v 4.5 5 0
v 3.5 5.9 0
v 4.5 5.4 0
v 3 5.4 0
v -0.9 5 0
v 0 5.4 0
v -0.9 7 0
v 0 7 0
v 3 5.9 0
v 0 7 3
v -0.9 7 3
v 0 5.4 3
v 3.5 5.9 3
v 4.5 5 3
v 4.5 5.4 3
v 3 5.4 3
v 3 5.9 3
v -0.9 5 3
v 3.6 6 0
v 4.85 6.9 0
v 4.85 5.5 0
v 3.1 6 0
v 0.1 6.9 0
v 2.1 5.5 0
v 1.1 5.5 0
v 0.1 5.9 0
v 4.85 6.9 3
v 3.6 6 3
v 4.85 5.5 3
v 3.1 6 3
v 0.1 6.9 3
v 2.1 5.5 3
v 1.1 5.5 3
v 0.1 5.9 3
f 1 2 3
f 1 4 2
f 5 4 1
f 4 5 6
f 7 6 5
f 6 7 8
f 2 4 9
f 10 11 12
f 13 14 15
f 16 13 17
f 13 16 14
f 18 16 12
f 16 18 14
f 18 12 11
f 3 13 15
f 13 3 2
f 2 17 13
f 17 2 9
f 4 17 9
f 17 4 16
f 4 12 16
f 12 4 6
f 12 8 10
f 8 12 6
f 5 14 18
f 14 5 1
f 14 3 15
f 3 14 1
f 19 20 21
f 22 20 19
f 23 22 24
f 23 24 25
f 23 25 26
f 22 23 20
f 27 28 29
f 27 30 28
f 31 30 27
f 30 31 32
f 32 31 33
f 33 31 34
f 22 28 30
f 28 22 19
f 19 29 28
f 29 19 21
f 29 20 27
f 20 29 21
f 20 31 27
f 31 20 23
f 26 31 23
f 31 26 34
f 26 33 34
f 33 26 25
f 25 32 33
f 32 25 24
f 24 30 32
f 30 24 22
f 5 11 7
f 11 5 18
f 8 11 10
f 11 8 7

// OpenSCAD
// file: hull.scad
/*
hull.scad - a library that leverages the hull() procedure
Author: Elliot Williams
github: https://gist.github.com/hexagon5un )
source: https://gist.github.com/hexagon5un/73e187dfa0404c69177795424f397ce6#file-hull-scad

Featured in the hackaday atricle: 'OPENSCAD: TIEING IT TOGETHER WITH HULL()'
https://hackaday.com/2018/02/13/openscad-tieing-it-together-with-hull/
*/
module multiHull(){
	for (i = [1 : $children-1])
		hull(){
			children(0);
			children(i);
		}
}

module sequentialHull(){
	for (i = [0: $children-2])
		hull(){
			children(i);
			children(i+1);
		}
}

/* Extended fun hull functions */ 

module cylinders(points, diameter, thickness){
	for (p=points){
		translate(p) cylinder(d=diameter, h=thickness, center=true);
	}
}

module plate(points, diameter, thickness, hole_diameter){
	difference(){
		hull() cylinders(points, diameter, thickness);
		cylinders(points, hole_diameter, 1000);
	}
}

module bar(length, width, thickness, hole_diameter){
	plate([[0,0,0], [length,0,0]], width, thickness, hole_diameter);
}

module rounded_box(points, radius, height, facets=30){
	hull(){
		for (p = points){
			translate(p)
				cylinder(r=radius, h=height, $fn=facets);
		}
	}
}

module point_cloud(points, radius=1, facets=8){
	for (p=points){
		translate(p)
			sphere(radius/cos(180/facets), $fn=facets);
		// polygon sphere circumscribed on radius
	}
}

module point_hull(points, radius=1, facets=8){
	hull(){
		point_cloud(points, radius, facets);
	}
}

// Shrink the exterior of the points so that the hull fits inside
function select(vector, i) = [ for (p=vector) p[i] ];
function axis_center(v, i) = (max(select(v, i)) - min(select(v,i)))/2;
function center(v) = [ for (i = [0,1,2]) axis_center(v, i) ];
function shrink_point(point, center, radius) = [ for (i = [0,1,2]) point[i] > center[i] ? point[i] - radius : point[i] + radius ]; 
function shrink(points, radius) = [ for (p = points) shrink_point(p, center(points), radius) ];

module interior_point_hull(points, radius=1){
	point_hull(shrink(points, radius), radius);
}

module interior_rounded_box(points, radius, height){
	rounded_box(shrink(points, radius), radius, height);
}


module mirror_copy(v = [1, 0, 0]) {
    children();
    mirror(v) children();
}
// file: basics.scad
///< Basics module
use <math.scad>;
use <utils.scad>;
use <hull.scad>;

module triangle( w, d, h ){
     difference(){
	  hyp = hyp_from_sides( d, h );
	  color( "red" )cube( [w, d, h] );
	  rotate( [ 45, 0, 0 ] )
	       translate( [ -0.01, 0, 0 ] )
	       color( "green" )cube( [w+0.2, hyp, h] );
     }
}

module tri_xy(pt1, pt2, pt3, h=1) {
     color( rands( 0,1,3 ) ) linear_extrude( height=h )
	  polygon( points=[ pt1, pt2, pt3 ] );
}

module triangle_xy( pts, h=1) {
     color( rands( 0,1,3 ) ) linear_extrude( height=h )
	  polygon( points = pts );
}

module oval(w,l, height, center = false, fn = 30) {
 scale([1, l/w, 1]) cylinder(h=height, r=w, center=center, $fn = fn);
}

module pipe( outer, inner, height, fn = 60 ){
     offset_percent = 0.25;
     inner_h = height + (offset_percent * 2 );
     difference(){
     ///< Debug with union(){
	  cylinder(r=outer, h = height, $fn = fn );
	  translate([0,0,-offset_percent]){
	       color("green",0.5)cylinder(r=inner, h = inner_h, $fn = fn );
	  }
     }
}

module rounded_pipe( r, h, fn = 60 ){
     cylinder(r = r, h = h, $fn = fn );

     color("blue")
     translate([0,0,h])
	  sphere(r, $fn = fn );

     color("red")
     translate([0,0,0])
	  sphere(r, $fn = fn );
}

/// Stackoverflow example module for a line
/// https://stackoverflow.com/questions/49533350/is-that-possible-to-draw-a-line-using-openscad-by-joining-different-points
module line(start, end, thickness = 1, fn = 30) {
    hull() {
	translate(start) sphere(thickness, $fn = fn);
	translate(end) sphere(thickness, $fn = fn);
    }
}


/*
Hulled box:

Parameterized box with rounded corners. This uses the hull.scad
to hull four cylinders around four point in space. This variation
offsets the box to zero/zero and takes in w,d,h to mesh better
with tuples.
*/
module hulled_cube( w, d, h, r = 1 ){
    points = [
	[ 0, 0, 0 ],
	[ w, 0, 0 ],
	[ 0, w, 0 ],
	[ w, w, 0 ],
	];
    resize( [w,d,h]){
	translate( [r, r,0] ){
	    rounded_box( points, radius = r, height=h );
	}
    }
}
// file: utils.scad
///< Utilities

function rand_clr() = rands( 0,1,3 );

///< Length conversions
function in2mm( i ) = ( i * 25.4 ); 
function mm2in( m ) = ( m / 25.4 );

/// This is pulled from stackoverflow
/// https://stackoverflow.com/questions/45826208/openscad-rotating-around-a-particular-point

// rotate as per a, v, but around point pt
module rotate_about_pt(a, v, pt) {
    translate(pt)
        rotate(a,v)
            translate(-pt)
                children();   
}
// file: math.scad
///< Math scad module


///< Find the hypotenuse from two sides of a right triangle
function hyp_from_sides( a, b ) = sqrt( pow( a, 2 ) + pow( b, 2 ) );

///< Find equal sides from hypotenuse of a right triangle
function sides_from_hyp(h) = sqrt( pow( h, 2 ) / 2 );

///< Find A from hypotenuse and B
function a_from_hb( h, b ) = sqrt( pow( h, 2 ) - pow( b, 2 ) );

function dist_2d( pt2, pt1 ) = sqrt(pow(( pt2[0]-pt1[0] ),2) + pow(( pt2[1]-pt1[1]),2) );

function mid_pt_2d( pt2, pt1 ) = [( pt1[0]+pt2[0] )/2, ( pt1[1]+pt2[1] )/2, 0 ];
///< Test for math functions

A = 3;
B = 4;
echo("Given A=", A, "and B=", B );
H = hyp_from_sides( A, B );
echo("Hypotenuse=", H );
echo("Calc Correct = ", (H == 5) );

echo("Given H=", H, " which is a hypotenuse with equal sides" );
echo( "the sides=", sides_from_hyp( H ) );

echo("Given H=", H, "B=", 4 );
echo("A=", a_from_hb( H, 4 ) );

echo("Distance from [-1,1] and [3,4] = ", dist_2d( [-1,1],[3,4]) );
// main file
///< Object definition
use <../lib/math.scad>;
use <../lib/utils.scad>;
use <../lib/basics.scad>;

/*
http://fab.cba.mit.edu/classes/S62.12/people/vernelle.noel/Plastic_Snap_fit_design.pdf

Parameters
y= (permissible) deflection (=undercut)
l= length of arm
h= thickness at root
b= width at root
c= distance between outer fiber and neutral fiber (center of gravity)
P= (permissible) deflection force
a= hypot of deflection
*/

thickness = 6.5;

module cantilever( y, h, b, p, a, l = 1, origin = 0, hide = false ){
       points = [
       [ origin,             origin],
       [ origin,             h     ],
       [ origin + b,         h     ],
       [ origin + b,         h + y ],
       [ origin + b + p,     h + y ],
       [ origin + b + p + a, h     ],
       [ origin + b + p + a, origin],
       ];
     if( !hide ){
     linear_extrude( height = l ){ polygon( points ); }
     }
}

module substrate( y, h, b, p, a, l = 1, origin = [0,0], hide = false, sep = 0.25, suby = 1, subx = 0 ){

     points = [
       [ origin[0],                       h + y ],           //< A
       [ origin[0],                       h + y + suby ],    //< B
       [ origin[0] + b + p + a + subx,    h + y + suby ],    //< C
       [ origin[0] + b + p + a + subx,    origin[1] + sep ], //< D
       [ origin[0] + b + p + a + subx,    origin[1] + sep ], //< E
       [ origin[0] + b + p + a + subx,    h + sep ],         //< F
       [ origin[0] + b + p,               h + sep + y ],     //< G
       [ origin[0] + b,                   h + sep + y ],     //< H
       [ origin[0] + b - a,               h + sep ],         //< I
       [ origin[0] + a,                   h + sep ],         //< J
       ];
     if( !hide ){
     linear_extrude( height = l ){ polygon( points ); }
     }
}

module snap_fit_sub( y, h, b, p, a, l = 1, origin = 0, hide = false, sep = 0, suby = 0, subx = 0, hide_sub = false, hide_lever = false ){

     color( "violet")cantilever( y = y, h = h, b = b, p = p, a = a, l = l, hide = hide_lever );
     color( "pink" )substrate(   y = y, h = h, b = b, p = p, a = a, l = l, sep = sep, suby = suby, subx = subx, hide = hide_sub, origin = [ sep, 0 ] );
}


module snap_fit_anchor( y, h, b, p, a, l = 1, origin = [0,0], hide = false, sep = 0, suby = 0, subx = 0, hide_sub = false, hide_lever = false ){

  color( "violet")cantilever( y = y, h = h, b = b, p = p, a = a, l = l, hide = hide_lever );
  color( "pink" )substrate(   y = y, h = h, b = b, p = p, a = a, l = l, sep = sep, suby = suby, subx = subx, hide = hide_sub, origin = [ sep, 0 ] );
 
  a_points = [
	      
	      
  ];
  cube_w = h+y;
  cube_h = h+y+sep+suby;
  translate( [-(h+y),0,0] )cube( [ cube_w, cube_h, l ] );

}



//snap_fit_sub( y = 1, h = 1-0.1, b = 6, p = 2, a = 2, sep = 0.1, suby = 0.1, subx = 0 );

//translate( [ 0, 3, 0 ] )snap_fit_sub( y = 0.5, h = 0.5-0.1, b = 3, p = 0.5, a = 1, l = 3, sep = 0.1, suby = 1, subx = 0.25 );


translate( [ 0, 5, 0 ] )snap_fit_anchor( y = 0.5, h = 0.5-0.1, b = 3, p = 0.5, a = 1, l = 3, sep = 0.1, suby = 1, subx = 0.25 );
